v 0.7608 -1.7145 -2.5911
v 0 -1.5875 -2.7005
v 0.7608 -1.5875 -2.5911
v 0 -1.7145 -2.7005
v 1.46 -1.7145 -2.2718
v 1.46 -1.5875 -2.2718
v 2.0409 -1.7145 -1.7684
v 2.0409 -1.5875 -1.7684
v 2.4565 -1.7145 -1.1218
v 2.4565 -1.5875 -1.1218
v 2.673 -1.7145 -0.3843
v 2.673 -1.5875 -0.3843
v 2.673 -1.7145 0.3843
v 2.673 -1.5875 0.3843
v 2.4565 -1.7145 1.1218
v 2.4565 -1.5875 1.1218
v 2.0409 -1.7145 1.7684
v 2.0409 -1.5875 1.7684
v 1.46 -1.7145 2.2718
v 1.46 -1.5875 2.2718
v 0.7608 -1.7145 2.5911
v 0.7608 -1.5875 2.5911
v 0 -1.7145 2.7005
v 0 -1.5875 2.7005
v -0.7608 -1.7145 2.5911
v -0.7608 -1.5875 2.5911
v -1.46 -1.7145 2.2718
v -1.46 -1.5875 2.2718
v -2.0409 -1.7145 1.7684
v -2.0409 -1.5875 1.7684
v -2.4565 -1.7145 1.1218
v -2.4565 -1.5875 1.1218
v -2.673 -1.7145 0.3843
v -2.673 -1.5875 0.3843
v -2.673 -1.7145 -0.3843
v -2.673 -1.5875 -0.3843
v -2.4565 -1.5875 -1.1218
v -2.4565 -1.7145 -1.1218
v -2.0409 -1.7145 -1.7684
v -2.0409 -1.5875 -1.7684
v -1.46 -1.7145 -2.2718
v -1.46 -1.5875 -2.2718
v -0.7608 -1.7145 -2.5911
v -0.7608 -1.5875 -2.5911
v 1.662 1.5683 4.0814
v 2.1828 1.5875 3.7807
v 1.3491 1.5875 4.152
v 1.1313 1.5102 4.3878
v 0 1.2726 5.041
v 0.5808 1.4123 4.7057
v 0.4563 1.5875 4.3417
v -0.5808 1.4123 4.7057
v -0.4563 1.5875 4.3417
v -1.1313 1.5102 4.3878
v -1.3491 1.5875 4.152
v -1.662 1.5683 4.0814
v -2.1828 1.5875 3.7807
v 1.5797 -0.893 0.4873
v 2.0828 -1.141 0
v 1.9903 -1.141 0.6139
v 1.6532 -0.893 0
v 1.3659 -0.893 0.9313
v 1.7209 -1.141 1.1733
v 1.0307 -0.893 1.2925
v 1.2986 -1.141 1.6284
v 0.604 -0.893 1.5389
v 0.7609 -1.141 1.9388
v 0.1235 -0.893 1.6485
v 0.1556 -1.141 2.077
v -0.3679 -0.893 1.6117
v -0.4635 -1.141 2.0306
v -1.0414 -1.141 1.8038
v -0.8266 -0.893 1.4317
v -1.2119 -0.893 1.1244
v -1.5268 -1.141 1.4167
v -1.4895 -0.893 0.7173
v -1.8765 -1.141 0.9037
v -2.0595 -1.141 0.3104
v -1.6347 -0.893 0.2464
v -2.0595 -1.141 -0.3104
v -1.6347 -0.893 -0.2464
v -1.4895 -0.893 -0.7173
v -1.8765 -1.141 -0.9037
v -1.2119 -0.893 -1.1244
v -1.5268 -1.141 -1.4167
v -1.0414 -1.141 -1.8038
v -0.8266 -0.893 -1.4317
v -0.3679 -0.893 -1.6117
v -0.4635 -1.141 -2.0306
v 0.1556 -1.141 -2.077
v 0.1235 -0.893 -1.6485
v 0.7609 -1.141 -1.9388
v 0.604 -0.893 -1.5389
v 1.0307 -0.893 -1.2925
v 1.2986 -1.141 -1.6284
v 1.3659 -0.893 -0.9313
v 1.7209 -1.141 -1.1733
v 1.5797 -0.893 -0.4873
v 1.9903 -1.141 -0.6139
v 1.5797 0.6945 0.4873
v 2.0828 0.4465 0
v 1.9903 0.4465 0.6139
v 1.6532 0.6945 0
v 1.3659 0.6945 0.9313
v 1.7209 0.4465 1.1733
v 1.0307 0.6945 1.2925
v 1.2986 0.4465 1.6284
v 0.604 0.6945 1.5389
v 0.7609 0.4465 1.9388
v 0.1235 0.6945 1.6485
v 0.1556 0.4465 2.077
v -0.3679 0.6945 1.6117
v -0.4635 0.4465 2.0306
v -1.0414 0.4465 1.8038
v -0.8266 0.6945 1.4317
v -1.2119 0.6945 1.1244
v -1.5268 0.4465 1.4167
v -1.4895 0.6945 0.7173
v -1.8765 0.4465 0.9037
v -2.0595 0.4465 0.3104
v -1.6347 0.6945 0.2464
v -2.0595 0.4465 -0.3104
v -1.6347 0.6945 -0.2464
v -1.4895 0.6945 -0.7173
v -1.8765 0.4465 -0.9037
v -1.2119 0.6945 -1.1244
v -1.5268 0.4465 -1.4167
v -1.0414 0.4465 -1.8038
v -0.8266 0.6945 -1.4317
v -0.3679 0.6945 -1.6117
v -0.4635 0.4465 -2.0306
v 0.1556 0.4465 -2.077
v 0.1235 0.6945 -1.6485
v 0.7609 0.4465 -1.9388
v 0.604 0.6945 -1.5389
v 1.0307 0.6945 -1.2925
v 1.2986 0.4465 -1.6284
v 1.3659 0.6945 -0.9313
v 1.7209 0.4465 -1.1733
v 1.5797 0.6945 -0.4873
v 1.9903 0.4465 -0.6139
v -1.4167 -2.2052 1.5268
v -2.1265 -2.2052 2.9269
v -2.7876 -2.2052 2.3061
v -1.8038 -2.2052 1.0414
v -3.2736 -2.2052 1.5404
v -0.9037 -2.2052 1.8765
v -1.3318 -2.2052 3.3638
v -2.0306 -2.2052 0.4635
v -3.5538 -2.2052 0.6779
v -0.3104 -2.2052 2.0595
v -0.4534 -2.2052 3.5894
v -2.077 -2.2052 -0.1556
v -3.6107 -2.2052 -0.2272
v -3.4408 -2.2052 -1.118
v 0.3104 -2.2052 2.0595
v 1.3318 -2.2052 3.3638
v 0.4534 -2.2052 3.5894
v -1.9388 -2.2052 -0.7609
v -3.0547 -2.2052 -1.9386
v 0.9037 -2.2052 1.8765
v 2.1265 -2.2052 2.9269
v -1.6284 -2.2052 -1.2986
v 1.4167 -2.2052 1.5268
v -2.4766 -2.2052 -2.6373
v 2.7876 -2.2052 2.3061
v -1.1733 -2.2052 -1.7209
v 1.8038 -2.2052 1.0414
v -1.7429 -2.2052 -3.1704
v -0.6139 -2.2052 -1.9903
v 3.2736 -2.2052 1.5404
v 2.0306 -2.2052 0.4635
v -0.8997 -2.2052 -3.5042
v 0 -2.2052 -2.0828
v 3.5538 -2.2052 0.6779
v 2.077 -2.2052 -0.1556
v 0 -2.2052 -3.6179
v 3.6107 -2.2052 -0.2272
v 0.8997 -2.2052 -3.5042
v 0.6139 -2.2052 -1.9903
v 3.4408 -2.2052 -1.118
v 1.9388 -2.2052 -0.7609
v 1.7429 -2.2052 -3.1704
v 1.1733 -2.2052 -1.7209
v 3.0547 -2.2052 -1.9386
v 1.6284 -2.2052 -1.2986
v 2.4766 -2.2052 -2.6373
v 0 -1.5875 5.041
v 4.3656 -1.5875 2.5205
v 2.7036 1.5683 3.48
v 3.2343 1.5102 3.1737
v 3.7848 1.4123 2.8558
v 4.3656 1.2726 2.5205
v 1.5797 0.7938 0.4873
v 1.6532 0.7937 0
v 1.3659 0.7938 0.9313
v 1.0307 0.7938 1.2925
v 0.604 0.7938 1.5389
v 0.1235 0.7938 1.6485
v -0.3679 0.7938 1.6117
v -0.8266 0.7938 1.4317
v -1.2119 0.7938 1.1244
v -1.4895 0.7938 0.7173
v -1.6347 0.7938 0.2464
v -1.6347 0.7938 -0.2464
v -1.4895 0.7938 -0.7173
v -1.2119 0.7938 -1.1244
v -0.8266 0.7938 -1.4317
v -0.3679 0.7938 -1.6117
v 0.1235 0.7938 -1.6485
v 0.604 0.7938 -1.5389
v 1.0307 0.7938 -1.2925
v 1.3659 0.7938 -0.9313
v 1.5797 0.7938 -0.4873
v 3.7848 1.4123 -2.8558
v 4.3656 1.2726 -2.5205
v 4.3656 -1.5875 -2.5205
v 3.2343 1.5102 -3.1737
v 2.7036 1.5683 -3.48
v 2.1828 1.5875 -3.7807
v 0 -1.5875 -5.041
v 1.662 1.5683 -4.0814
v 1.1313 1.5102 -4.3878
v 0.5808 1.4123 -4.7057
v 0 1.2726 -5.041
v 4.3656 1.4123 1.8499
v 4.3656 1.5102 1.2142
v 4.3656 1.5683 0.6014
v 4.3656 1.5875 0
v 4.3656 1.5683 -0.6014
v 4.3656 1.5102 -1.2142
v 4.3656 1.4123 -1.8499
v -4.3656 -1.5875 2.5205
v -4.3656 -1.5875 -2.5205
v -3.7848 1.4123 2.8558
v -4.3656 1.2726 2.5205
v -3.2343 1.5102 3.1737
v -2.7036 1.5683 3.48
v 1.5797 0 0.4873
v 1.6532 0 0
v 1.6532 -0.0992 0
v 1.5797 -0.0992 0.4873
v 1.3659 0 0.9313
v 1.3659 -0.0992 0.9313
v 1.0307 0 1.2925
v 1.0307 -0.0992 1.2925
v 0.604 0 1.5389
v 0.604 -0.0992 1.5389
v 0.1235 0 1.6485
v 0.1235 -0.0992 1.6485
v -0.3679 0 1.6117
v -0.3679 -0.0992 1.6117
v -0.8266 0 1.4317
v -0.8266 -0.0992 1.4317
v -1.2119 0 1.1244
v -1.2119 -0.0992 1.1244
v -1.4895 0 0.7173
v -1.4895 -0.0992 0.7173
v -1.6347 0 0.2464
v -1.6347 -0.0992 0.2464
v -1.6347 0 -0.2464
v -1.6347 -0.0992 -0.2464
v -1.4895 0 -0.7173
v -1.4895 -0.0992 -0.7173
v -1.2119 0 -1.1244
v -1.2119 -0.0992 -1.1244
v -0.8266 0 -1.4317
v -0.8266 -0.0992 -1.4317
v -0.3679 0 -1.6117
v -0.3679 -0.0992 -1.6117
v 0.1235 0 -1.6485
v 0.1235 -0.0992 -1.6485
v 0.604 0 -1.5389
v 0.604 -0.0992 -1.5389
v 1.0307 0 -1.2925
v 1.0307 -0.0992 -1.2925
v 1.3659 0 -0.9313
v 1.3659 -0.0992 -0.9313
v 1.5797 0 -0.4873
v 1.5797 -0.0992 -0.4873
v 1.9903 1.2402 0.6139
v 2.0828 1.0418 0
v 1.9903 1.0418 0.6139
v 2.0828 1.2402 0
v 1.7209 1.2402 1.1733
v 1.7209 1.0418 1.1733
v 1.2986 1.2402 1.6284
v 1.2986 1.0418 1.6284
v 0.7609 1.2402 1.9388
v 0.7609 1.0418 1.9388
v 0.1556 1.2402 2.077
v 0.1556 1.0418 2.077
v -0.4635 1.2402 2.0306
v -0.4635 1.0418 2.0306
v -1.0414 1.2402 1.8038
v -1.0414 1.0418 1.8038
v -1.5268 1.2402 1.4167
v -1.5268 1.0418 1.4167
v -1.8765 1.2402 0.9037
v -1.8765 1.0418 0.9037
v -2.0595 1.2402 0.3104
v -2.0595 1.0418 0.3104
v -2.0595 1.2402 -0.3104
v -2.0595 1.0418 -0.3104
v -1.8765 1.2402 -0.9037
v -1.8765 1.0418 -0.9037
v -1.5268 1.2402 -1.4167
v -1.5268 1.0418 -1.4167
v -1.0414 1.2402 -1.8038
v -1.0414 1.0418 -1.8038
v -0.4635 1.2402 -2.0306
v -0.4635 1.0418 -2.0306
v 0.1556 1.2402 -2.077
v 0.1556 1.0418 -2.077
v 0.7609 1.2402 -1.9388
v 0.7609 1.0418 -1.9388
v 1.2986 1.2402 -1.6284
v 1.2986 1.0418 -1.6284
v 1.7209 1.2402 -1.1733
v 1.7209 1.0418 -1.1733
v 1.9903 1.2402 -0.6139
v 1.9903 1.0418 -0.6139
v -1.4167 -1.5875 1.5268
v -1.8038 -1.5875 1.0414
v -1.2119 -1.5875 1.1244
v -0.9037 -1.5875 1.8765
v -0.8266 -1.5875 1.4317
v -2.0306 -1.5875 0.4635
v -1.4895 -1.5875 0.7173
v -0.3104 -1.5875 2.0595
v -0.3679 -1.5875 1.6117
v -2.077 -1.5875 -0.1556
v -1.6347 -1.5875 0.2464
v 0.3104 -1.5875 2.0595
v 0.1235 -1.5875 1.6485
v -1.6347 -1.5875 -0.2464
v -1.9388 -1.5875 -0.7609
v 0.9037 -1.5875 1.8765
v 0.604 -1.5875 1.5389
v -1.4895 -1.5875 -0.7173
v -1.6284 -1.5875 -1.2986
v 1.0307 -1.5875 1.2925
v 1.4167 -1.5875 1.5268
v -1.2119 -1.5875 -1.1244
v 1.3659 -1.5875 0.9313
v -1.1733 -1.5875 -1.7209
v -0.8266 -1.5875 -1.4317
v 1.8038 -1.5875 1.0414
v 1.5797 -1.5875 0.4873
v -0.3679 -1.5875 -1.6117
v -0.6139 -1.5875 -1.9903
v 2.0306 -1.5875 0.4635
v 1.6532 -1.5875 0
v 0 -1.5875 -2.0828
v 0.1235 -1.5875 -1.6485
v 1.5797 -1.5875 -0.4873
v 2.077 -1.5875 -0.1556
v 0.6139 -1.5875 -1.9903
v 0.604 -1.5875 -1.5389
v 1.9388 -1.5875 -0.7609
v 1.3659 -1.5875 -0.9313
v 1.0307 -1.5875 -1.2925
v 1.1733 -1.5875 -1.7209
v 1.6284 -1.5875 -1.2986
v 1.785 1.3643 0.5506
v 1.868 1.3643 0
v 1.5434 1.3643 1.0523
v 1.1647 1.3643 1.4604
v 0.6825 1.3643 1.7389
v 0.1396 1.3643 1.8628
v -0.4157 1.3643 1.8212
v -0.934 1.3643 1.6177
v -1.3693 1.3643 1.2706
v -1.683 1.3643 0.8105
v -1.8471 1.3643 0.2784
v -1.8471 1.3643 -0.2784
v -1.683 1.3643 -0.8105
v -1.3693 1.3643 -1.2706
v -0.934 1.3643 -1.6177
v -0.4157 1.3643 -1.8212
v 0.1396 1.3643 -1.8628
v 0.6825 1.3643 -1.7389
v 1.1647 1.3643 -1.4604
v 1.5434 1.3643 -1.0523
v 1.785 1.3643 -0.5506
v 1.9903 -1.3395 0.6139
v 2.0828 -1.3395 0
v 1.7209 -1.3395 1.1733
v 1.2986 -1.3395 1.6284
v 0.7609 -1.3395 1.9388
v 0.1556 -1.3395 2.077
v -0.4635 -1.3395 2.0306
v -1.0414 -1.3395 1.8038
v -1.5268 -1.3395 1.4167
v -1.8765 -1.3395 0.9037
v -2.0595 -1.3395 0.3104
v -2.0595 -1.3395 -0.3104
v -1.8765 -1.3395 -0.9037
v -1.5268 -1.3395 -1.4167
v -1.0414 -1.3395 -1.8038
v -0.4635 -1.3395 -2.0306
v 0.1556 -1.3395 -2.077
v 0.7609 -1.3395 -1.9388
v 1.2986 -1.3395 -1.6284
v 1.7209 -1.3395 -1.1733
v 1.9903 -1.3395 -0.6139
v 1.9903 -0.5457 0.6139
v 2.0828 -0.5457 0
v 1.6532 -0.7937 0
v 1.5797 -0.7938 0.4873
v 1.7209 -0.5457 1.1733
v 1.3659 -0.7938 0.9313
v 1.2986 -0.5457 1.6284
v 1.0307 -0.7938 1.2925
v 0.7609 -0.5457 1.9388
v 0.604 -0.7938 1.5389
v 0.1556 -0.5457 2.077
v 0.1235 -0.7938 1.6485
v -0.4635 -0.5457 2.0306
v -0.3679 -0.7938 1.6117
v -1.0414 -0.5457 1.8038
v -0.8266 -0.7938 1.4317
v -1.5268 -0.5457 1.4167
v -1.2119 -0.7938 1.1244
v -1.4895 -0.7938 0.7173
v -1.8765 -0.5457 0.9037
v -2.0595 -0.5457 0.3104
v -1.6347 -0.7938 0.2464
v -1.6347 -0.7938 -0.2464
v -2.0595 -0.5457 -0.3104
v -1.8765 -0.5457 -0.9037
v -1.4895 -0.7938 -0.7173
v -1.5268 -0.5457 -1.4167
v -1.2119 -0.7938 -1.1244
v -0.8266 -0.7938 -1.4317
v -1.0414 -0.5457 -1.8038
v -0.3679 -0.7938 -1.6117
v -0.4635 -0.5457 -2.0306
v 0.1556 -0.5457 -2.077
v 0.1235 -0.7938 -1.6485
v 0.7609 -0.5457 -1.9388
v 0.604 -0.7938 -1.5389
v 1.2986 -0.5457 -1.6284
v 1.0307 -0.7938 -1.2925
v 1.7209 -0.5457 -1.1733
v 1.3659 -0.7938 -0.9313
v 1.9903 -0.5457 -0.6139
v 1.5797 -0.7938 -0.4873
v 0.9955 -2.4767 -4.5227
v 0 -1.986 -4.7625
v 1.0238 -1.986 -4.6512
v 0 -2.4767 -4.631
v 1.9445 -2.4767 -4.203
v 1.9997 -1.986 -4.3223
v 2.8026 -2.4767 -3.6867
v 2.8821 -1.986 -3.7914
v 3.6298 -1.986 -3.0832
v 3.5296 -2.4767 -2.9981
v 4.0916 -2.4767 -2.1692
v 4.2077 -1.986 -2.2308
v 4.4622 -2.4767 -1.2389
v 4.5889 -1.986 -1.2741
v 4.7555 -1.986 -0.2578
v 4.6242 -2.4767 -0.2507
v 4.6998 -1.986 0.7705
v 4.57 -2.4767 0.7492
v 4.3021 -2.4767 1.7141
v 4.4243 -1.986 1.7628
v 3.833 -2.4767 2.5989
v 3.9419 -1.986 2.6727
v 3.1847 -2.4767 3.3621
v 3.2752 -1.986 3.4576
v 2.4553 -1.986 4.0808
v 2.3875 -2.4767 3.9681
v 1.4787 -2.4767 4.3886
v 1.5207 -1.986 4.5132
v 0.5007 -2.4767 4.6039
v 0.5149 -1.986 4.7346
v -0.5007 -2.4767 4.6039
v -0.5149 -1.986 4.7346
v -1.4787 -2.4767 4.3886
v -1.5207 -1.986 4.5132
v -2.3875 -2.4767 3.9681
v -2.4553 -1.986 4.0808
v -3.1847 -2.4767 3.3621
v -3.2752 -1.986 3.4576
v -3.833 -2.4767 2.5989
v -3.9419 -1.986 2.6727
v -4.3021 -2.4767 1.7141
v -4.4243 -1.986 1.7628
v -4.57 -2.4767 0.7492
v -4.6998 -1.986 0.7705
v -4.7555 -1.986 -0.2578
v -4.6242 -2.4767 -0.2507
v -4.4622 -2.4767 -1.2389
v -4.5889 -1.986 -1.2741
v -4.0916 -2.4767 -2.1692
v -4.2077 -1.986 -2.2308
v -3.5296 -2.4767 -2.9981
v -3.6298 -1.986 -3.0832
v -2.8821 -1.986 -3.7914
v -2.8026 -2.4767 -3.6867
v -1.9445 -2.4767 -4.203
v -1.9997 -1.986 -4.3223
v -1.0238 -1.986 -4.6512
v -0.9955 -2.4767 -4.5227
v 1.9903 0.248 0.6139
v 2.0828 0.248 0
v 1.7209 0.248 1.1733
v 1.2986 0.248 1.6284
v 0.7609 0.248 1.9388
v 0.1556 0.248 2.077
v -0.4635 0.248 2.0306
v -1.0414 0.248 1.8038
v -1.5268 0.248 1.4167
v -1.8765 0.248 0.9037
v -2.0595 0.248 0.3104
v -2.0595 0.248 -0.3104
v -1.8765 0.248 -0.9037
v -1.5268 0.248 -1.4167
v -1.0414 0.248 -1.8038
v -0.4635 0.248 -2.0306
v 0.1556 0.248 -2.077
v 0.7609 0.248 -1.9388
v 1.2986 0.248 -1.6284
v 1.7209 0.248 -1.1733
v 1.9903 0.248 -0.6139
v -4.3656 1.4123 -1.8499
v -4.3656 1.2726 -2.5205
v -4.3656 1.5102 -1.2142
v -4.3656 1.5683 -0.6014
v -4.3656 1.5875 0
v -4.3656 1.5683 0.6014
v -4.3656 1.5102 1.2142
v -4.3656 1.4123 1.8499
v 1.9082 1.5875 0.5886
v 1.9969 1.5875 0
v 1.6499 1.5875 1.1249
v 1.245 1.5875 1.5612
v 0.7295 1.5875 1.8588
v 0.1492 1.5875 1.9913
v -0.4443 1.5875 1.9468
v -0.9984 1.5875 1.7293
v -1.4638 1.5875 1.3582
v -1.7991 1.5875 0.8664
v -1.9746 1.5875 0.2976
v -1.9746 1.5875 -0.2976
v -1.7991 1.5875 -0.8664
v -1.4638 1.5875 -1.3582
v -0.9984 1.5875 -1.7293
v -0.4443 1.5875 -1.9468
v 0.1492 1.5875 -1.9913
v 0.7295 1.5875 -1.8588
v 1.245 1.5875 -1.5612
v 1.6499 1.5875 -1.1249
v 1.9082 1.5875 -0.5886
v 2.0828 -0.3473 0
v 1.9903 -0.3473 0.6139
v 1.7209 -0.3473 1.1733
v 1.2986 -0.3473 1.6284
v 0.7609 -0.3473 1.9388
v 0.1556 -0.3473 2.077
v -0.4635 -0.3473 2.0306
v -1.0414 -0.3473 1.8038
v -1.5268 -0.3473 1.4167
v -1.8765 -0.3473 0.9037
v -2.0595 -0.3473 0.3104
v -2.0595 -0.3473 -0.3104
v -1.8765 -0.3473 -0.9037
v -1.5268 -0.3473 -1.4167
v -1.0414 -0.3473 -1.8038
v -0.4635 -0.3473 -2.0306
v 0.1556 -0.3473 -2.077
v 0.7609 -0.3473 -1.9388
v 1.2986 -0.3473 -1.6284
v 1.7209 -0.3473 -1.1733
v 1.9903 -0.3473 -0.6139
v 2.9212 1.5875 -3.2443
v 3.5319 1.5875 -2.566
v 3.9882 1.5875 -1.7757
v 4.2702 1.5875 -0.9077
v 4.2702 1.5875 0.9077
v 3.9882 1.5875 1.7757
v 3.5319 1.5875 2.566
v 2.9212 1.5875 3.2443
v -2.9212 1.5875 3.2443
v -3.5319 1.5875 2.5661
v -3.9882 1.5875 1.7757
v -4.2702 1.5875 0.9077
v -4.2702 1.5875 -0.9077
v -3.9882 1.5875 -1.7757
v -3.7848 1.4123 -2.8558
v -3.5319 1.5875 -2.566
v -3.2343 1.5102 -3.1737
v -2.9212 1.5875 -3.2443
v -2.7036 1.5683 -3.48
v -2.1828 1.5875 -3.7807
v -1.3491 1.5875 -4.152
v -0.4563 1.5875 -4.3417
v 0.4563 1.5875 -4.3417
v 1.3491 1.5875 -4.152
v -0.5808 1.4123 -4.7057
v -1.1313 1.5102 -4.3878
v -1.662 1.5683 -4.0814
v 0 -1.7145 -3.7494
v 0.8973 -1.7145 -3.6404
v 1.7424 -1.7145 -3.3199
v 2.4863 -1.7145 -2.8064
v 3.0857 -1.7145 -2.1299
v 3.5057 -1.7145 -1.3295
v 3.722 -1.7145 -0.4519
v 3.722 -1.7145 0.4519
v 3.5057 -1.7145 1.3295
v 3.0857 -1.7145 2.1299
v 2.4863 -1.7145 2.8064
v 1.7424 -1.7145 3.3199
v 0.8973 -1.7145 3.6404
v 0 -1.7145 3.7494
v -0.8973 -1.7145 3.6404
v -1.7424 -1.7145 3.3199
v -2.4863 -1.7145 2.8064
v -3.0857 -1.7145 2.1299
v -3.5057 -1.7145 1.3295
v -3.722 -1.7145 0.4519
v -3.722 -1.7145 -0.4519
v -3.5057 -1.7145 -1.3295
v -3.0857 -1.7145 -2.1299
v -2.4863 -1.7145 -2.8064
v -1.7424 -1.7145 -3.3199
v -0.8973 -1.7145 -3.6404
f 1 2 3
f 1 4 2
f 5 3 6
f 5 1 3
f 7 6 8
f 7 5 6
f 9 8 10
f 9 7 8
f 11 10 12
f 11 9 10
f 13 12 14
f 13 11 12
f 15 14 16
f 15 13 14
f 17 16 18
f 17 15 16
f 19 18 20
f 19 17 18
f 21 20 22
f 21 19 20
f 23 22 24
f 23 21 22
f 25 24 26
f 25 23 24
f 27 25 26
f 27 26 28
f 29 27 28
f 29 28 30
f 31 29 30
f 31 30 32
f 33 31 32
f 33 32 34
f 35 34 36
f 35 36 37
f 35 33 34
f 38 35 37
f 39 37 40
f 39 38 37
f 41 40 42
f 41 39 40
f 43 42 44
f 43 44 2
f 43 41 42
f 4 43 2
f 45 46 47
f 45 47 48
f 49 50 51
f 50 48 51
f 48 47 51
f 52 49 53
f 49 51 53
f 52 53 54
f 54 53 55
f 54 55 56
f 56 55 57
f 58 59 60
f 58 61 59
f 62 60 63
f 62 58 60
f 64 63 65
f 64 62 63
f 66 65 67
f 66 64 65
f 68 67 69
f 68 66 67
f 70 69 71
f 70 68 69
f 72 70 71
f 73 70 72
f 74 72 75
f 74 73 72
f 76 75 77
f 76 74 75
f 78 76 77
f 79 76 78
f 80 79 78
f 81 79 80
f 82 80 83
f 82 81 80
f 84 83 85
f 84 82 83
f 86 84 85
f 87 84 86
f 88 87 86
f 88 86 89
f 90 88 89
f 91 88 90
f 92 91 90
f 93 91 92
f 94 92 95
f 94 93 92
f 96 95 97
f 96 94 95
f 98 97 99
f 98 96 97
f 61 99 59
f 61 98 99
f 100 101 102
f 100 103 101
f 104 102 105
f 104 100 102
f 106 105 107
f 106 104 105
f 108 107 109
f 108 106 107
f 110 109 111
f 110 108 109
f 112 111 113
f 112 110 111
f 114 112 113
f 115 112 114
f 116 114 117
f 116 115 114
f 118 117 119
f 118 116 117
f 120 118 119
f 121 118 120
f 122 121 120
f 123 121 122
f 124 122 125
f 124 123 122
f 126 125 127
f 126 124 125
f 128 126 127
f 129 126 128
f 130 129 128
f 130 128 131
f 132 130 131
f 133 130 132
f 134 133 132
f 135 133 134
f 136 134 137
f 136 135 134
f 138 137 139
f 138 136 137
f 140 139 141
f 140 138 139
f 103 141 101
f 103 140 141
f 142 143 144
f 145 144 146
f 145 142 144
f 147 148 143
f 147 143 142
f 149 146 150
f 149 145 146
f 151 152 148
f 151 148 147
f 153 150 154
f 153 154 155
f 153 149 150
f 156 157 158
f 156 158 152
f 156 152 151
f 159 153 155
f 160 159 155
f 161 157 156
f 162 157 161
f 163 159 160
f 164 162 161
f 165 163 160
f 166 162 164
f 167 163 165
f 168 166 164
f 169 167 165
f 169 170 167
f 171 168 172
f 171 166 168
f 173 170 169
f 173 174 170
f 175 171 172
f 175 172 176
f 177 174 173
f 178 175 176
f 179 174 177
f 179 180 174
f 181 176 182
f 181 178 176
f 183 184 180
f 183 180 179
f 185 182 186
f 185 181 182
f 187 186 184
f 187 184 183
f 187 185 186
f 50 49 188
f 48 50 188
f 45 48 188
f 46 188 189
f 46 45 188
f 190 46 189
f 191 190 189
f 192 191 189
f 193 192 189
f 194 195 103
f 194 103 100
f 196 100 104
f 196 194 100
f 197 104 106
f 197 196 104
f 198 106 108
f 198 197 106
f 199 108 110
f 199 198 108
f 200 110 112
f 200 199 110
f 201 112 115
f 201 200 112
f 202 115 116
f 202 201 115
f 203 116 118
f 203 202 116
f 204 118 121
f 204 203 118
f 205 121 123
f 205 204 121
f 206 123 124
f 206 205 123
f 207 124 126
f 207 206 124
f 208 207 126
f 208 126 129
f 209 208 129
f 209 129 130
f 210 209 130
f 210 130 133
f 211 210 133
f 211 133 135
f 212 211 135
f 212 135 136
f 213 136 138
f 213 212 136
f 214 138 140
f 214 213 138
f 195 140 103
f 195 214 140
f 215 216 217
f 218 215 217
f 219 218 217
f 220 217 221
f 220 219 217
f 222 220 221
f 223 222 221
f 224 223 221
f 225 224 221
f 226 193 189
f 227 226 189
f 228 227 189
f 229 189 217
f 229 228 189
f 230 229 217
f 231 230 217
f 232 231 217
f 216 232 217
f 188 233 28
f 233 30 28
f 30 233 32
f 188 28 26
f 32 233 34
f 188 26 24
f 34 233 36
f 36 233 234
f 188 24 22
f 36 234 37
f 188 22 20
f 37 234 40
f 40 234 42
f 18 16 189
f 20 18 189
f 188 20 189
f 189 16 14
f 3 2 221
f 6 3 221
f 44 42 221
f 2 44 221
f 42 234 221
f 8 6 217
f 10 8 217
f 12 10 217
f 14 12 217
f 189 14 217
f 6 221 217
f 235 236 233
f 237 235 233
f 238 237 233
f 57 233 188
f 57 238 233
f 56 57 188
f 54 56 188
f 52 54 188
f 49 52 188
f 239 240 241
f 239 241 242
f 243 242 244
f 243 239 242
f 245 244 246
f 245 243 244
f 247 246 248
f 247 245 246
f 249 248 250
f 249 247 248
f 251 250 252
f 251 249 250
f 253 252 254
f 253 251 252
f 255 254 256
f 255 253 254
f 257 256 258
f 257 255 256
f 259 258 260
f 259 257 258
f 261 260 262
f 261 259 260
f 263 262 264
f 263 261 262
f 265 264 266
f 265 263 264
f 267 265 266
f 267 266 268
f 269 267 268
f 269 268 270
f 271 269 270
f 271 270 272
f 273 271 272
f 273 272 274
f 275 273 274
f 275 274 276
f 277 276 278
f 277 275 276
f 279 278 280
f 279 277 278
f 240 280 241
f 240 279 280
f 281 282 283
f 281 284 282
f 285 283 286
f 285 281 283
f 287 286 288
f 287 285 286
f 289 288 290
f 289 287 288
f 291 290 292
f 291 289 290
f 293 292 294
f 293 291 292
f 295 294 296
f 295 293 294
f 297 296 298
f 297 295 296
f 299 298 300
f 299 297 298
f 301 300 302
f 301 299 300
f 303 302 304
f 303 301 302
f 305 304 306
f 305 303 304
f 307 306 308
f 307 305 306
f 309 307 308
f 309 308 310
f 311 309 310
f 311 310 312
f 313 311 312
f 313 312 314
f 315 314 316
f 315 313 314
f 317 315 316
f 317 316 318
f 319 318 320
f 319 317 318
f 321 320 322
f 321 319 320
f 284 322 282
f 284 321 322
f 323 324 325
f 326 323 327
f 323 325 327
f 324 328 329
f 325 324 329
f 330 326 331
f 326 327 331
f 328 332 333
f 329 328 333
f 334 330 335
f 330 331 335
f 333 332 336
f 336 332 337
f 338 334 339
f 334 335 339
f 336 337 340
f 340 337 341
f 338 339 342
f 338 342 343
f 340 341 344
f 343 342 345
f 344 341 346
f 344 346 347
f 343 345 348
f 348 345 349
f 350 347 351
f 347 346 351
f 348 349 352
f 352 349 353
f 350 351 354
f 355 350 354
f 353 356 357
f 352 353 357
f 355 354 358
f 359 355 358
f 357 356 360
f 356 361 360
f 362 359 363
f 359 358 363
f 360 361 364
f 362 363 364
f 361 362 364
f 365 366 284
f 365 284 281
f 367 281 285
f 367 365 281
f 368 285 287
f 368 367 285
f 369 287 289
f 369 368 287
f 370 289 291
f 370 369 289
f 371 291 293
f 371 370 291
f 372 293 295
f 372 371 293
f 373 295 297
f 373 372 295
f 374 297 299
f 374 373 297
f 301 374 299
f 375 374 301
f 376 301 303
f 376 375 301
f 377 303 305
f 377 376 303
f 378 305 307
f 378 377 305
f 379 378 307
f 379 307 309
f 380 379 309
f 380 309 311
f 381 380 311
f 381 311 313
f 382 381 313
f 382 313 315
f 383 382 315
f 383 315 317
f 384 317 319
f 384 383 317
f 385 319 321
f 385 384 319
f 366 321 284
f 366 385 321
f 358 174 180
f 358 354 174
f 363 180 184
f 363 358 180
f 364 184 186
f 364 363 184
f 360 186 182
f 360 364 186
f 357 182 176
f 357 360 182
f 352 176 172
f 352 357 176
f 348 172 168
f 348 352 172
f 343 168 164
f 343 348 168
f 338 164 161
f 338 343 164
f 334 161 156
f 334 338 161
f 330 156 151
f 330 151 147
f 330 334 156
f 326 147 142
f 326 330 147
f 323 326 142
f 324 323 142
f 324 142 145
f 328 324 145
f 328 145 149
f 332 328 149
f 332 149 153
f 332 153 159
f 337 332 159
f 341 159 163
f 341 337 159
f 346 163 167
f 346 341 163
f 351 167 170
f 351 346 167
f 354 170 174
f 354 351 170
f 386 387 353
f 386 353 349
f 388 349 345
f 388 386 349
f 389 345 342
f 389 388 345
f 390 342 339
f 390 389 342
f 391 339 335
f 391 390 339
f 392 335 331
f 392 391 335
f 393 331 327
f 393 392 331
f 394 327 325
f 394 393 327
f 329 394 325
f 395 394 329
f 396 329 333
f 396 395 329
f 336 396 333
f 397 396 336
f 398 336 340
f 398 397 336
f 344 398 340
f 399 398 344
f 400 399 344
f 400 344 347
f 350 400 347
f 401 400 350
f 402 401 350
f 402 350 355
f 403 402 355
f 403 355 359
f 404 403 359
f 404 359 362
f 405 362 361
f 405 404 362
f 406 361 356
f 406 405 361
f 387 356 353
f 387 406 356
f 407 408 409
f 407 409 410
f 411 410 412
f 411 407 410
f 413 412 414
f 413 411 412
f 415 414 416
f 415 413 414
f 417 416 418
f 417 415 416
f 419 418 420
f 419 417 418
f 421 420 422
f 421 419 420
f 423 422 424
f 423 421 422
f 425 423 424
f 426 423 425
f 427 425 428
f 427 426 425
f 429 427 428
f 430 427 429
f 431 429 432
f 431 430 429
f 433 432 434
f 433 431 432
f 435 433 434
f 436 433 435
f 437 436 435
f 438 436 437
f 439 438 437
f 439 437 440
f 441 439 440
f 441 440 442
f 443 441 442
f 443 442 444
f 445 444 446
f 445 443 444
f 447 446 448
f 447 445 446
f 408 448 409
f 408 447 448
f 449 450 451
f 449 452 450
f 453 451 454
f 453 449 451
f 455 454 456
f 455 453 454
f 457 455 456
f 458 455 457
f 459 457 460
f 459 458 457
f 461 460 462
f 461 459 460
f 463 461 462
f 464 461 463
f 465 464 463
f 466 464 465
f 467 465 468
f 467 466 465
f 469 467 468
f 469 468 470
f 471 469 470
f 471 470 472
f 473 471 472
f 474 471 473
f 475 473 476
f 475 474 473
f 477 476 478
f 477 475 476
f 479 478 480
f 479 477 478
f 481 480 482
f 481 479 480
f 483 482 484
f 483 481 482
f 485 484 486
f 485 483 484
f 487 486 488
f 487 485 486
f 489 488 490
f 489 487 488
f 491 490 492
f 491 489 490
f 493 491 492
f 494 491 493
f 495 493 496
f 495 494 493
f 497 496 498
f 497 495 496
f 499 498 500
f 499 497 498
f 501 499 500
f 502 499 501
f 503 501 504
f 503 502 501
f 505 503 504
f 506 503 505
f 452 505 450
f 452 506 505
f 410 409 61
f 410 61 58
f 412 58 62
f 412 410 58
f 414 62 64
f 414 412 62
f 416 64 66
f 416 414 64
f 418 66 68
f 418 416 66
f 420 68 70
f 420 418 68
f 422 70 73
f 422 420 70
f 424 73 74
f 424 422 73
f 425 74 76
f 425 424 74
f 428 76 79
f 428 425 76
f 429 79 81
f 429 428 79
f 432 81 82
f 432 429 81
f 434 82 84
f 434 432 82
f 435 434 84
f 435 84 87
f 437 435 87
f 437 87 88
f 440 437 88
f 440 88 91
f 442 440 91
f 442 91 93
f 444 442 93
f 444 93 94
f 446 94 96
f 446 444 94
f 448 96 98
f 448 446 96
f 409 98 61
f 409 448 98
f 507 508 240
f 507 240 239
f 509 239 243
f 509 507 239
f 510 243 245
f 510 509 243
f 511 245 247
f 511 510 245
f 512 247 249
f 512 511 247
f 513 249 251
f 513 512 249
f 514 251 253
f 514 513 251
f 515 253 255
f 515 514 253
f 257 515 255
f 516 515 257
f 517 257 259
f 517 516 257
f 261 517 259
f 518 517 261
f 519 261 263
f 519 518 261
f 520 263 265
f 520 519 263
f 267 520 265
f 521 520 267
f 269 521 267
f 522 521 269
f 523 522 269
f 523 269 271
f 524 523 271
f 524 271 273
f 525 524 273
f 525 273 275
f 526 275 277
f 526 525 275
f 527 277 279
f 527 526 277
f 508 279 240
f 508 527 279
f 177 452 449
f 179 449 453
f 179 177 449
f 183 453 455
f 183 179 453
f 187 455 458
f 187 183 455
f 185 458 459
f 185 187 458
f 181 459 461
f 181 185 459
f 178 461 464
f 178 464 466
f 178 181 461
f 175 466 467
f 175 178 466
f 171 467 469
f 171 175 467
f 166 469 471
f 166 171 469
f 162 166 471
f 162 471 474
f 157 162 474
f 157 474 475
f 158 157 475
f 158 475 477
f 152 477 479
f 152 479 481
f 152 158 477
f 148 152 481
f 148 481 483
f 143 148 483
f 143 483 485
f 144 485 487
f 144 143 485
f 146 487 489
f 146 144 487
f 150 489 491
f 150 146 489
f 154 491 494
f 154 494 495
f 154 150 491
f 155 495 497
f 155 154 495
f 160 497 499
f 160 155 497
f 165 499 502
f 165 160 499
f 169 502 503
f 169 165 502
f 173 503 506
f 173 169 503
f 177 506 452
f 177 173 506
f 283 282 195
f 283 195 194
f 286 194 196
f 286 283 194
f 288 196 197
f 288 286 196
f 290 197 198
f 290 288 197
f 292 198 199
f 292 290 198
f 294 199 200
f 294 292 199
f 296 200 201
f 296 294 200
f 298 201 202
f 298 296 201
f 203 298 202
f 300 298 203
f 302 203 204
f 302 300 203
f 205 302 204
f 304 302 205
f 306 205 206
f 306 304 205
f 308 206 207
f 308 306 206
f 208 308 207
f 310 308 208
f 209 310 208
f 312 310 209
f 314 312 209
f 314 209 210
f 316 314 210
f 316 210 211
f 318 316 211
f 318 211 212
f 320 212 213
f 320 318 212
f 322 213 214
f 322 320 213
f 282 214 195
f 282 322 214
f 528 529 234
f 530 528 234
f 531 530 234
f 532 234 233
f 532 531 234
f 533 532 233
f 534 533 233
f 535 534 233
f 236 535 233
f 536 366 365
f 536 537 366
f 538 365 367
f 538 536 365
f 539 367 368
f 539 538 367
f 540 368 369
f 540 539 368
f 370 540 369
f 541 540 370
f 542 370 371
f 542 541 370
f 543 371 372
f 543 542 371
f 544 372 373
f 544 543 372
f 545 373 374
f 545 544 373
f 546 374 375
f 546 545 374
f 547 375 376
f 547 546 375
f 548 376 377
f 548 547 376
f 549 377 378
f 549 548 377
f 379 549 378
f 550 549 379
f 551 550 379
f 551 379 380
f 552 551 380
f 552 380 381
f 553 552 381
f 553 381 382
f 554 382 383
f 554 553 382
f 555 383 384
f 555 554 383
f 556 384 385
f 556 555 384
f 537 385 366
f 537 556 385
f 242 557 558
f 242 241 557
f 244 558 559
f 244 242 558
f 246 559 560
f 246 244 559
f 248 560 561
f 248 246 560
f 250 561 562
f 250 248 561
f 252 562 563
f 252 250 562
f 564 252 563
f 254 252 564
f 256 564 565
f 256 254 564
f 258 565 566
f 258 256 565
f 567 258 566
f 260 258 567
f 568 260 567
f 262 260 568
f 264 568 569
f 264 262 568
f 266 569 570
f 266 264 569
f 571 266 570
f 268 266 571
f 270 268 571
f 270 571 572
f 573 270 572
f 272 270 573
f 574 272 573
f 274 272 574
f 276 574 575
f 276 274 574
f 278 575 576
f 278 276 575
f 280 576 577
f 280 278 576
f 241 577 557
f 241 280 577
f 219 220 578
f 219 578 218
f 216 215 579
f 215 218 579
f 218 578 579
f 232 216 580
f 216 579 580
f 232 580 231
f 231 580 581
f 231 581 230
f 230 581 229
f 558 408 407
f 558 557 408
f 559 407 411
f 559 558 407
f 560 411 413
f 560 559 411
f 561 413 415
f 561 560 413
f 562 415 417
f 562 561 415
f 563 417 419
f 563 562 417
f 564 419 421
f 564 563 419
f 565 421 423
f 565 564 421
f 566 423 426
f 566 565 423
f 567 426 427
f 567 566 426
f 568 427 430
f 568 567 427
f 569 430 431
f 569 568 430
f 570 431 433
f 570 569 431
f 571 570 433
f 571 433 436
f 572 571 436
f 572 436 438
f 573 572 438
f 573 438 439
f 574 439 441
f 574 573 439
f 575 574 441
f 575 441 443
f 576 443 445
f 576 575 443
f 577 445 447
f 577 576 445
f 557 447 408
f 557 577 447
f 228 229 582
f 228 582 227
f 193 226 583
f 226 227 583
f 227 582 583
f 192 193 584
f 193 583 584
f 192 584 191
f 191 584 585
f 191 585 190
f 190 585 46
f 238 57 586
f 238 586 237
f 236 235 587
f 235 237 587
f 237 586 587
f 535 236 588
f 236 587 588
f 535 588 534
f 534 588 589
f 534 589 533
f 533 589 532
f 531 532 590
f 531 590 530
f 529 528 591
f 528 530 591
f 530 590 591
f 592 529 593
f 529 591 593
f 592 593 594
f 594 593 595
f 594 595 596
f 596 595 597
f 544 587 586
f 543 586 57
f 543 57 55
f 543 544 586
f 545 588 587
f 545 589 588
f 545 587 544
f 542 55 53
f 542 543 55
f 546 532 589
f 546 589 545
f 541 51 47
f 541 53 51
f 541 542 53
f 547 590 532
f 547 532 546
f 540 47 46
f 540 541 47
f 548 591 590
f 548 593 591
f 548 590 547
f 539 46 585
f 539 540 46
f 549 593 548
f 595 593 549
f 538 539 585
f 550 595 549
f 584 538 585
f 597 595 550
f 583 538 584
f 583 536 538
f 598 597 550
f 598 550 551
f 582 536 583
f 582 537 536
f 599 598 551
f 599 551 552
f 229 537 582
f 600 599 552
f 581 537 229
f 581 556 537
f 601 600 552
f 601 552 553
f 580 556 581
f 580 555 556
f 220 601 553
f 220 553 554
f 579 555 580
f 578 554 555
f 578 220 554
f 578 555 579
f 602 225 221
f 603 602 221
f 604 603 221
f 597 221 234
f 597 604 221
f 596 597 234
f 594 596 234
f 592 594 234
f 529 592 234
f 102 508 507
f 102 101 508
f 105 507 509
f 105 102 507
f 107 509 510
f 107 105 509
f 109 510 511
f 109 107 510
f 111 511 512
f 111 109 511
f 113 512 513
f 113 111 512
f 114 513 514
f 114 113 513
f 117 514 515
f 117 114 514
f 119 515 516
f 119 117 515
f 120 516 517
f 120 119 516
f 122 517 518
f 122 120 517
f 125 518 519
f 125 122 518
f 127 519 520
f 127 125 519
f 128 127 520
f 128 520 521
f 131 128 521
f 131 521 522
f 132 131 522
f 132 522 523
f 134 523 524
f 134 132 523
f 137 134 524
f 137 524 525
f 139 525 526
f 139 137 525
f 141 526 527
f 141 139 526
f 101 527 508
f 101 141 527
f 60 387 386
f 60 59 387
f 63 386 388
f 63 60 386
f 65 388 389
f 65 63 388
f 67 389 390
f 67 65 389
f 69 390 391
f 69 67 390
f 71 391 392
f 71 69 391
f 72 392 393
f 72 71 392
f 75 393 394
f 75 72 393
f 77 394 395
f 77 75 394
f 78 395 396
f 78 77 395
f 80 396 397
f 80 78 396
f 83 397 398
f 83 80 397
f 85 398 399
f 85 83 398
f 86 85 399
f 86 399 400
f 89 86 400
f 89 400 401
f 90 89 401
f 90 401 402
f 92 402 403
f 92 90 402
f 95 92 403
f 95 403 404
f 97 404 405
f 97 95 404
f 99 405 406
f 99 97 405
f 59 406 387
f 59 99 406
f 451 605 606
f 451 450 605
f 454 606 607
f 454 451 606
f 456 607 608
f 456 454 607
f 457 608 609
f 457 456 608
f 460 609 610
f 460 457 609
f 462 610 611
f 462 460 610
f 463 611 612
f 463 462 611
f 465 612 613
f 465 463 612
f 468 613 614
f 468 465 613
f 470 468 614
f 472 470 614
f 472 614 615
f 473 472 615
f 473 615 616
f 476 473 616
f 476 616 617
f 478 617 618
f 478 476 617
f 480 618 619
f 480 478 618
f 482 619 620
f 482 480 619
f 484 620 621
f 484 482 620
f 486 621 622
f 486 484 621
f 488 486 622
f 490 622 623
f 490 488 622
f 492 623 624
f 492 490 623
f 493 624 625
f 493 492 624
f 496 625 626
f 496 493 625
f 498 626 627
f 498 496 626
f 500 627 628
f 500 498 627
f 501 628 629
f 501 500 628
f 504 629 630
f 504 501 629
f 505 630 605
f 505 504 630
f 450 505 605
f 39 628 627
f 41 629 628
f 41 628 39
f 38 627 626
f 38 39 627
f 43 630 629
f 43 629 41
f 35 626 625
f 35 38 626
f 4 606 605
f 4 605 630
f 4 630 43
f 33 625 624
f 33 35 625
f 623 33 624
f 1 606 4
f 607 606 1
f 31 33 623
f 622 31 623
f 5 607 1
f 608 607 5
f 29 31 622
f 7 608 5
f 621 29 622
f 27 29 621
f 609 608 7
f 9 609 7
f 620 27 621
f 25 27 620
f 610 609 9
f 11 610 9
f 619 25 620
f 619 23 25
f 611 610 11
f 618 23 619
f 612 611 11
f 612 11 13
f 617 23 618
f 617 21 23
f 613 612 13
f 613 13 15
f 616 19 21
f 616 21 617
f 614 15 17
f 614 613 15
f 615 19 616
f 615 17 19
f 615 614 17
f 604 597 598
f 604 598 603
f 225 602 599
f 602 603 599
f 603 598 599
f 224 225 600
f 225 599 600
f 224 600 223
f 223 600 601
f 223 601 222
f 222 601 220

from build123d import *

# Parameters (mm, degrees)
EXTRUDE1_DEPTH  = 1.5875
LPATTERN2_COUNT = 5
LPATTERN2_PITCH = 0.79375


with BuildPart() as part:
    # Sketch1 → Extrude1 (new body, symmetric)
    with BuildSketch(Plane(origin=(0, 0, 0), x_dir=(1, 0, 0), z_dir=(0, 1, 0))):
        Polygon((0, 5.040989538), (-4.365625, 2.520494769), (-4.365625, -2.520494769), (0, -5.040989538), (4.365625, -2.520494769), (4.365625, 2.520494769), align=None)
    extrude(amount=EXTRUDE1_DEPTH, both=True)

    # Sketch2 → Cut-Revolve1 (revolve, cut)
    with BuildSketch(Plane(origin=(0, 0, 0), x_dir=(0, 0, -1), z_dir=(1, 0, 0))):
        Polygon((4.365625, 1.5875), (5.040989538, 1.5875), (5.040989538, 1.272572344), align=None)
    revolve(axis=Axis((0, 1.421434714, 0), (0, -1, 0)), mode=Mode.SUBTRACT)

    # Sketch3 → Cut-Revolve3 (revolve, cut)
    with BuildSketch(Plane.XY):
        Polygon((1.65317021, 1.48828125), (1.65317021, 1.5875), (0, 1.5875), (0, 0.79375), (1.65317021, 0.79375), (2.0828, 1.041796875), (2.0828, 1.240234375), align=None)
    cut_revolve3 = revolve(axis=Axis((0, 1.642101285, 0), (0, -1, 0)), mode=Mode.SUBTRACT)

    # LPattern2: Cut-Revolve3 ×5
    with Locations(*[(0, -i * LPATTERN2_PITCH, 0) for i in range(1, LPATTERN2_COUNT)]):
        add(cut_revolve3, mode=Mode.SUBTRACT)

    # Sketch4 → Cut-Revolve4 (revolve, cut)
    with BuildSketch(Plane.XY):
        Polygon((1.867985105, 1.364257812), (1.996874042, 1.5875), (1.65317021, 1.5875), (1.65317021, 1.48828125), align=None)
    revolve(axis=Axis((0, 1.785862642, 0), (0, -1, 0)), mode=Mode.SUBTRACT)

    # Sketch12 → Revolve1 (revolve)
    with BuildSketch(Plane(origin=(0, 0, 0), x_dir=(0, 0, -1), z_dir=(1, 0, 0))):
        Polygon((2.70049032, -1.7145), (3.749364928, -1.7145), (4.7625, -1.985968724), (4.631019925, -2.476659044), (3.617884853, -2.20519032), (2.0828, -2.20519032), (2.0828, -1.5875), (2.70049032, -1.5875), align=None)
    revolve(axis=Axis((0, 1.620050577, 0), (0, -1, 0)))


solid = part.part
